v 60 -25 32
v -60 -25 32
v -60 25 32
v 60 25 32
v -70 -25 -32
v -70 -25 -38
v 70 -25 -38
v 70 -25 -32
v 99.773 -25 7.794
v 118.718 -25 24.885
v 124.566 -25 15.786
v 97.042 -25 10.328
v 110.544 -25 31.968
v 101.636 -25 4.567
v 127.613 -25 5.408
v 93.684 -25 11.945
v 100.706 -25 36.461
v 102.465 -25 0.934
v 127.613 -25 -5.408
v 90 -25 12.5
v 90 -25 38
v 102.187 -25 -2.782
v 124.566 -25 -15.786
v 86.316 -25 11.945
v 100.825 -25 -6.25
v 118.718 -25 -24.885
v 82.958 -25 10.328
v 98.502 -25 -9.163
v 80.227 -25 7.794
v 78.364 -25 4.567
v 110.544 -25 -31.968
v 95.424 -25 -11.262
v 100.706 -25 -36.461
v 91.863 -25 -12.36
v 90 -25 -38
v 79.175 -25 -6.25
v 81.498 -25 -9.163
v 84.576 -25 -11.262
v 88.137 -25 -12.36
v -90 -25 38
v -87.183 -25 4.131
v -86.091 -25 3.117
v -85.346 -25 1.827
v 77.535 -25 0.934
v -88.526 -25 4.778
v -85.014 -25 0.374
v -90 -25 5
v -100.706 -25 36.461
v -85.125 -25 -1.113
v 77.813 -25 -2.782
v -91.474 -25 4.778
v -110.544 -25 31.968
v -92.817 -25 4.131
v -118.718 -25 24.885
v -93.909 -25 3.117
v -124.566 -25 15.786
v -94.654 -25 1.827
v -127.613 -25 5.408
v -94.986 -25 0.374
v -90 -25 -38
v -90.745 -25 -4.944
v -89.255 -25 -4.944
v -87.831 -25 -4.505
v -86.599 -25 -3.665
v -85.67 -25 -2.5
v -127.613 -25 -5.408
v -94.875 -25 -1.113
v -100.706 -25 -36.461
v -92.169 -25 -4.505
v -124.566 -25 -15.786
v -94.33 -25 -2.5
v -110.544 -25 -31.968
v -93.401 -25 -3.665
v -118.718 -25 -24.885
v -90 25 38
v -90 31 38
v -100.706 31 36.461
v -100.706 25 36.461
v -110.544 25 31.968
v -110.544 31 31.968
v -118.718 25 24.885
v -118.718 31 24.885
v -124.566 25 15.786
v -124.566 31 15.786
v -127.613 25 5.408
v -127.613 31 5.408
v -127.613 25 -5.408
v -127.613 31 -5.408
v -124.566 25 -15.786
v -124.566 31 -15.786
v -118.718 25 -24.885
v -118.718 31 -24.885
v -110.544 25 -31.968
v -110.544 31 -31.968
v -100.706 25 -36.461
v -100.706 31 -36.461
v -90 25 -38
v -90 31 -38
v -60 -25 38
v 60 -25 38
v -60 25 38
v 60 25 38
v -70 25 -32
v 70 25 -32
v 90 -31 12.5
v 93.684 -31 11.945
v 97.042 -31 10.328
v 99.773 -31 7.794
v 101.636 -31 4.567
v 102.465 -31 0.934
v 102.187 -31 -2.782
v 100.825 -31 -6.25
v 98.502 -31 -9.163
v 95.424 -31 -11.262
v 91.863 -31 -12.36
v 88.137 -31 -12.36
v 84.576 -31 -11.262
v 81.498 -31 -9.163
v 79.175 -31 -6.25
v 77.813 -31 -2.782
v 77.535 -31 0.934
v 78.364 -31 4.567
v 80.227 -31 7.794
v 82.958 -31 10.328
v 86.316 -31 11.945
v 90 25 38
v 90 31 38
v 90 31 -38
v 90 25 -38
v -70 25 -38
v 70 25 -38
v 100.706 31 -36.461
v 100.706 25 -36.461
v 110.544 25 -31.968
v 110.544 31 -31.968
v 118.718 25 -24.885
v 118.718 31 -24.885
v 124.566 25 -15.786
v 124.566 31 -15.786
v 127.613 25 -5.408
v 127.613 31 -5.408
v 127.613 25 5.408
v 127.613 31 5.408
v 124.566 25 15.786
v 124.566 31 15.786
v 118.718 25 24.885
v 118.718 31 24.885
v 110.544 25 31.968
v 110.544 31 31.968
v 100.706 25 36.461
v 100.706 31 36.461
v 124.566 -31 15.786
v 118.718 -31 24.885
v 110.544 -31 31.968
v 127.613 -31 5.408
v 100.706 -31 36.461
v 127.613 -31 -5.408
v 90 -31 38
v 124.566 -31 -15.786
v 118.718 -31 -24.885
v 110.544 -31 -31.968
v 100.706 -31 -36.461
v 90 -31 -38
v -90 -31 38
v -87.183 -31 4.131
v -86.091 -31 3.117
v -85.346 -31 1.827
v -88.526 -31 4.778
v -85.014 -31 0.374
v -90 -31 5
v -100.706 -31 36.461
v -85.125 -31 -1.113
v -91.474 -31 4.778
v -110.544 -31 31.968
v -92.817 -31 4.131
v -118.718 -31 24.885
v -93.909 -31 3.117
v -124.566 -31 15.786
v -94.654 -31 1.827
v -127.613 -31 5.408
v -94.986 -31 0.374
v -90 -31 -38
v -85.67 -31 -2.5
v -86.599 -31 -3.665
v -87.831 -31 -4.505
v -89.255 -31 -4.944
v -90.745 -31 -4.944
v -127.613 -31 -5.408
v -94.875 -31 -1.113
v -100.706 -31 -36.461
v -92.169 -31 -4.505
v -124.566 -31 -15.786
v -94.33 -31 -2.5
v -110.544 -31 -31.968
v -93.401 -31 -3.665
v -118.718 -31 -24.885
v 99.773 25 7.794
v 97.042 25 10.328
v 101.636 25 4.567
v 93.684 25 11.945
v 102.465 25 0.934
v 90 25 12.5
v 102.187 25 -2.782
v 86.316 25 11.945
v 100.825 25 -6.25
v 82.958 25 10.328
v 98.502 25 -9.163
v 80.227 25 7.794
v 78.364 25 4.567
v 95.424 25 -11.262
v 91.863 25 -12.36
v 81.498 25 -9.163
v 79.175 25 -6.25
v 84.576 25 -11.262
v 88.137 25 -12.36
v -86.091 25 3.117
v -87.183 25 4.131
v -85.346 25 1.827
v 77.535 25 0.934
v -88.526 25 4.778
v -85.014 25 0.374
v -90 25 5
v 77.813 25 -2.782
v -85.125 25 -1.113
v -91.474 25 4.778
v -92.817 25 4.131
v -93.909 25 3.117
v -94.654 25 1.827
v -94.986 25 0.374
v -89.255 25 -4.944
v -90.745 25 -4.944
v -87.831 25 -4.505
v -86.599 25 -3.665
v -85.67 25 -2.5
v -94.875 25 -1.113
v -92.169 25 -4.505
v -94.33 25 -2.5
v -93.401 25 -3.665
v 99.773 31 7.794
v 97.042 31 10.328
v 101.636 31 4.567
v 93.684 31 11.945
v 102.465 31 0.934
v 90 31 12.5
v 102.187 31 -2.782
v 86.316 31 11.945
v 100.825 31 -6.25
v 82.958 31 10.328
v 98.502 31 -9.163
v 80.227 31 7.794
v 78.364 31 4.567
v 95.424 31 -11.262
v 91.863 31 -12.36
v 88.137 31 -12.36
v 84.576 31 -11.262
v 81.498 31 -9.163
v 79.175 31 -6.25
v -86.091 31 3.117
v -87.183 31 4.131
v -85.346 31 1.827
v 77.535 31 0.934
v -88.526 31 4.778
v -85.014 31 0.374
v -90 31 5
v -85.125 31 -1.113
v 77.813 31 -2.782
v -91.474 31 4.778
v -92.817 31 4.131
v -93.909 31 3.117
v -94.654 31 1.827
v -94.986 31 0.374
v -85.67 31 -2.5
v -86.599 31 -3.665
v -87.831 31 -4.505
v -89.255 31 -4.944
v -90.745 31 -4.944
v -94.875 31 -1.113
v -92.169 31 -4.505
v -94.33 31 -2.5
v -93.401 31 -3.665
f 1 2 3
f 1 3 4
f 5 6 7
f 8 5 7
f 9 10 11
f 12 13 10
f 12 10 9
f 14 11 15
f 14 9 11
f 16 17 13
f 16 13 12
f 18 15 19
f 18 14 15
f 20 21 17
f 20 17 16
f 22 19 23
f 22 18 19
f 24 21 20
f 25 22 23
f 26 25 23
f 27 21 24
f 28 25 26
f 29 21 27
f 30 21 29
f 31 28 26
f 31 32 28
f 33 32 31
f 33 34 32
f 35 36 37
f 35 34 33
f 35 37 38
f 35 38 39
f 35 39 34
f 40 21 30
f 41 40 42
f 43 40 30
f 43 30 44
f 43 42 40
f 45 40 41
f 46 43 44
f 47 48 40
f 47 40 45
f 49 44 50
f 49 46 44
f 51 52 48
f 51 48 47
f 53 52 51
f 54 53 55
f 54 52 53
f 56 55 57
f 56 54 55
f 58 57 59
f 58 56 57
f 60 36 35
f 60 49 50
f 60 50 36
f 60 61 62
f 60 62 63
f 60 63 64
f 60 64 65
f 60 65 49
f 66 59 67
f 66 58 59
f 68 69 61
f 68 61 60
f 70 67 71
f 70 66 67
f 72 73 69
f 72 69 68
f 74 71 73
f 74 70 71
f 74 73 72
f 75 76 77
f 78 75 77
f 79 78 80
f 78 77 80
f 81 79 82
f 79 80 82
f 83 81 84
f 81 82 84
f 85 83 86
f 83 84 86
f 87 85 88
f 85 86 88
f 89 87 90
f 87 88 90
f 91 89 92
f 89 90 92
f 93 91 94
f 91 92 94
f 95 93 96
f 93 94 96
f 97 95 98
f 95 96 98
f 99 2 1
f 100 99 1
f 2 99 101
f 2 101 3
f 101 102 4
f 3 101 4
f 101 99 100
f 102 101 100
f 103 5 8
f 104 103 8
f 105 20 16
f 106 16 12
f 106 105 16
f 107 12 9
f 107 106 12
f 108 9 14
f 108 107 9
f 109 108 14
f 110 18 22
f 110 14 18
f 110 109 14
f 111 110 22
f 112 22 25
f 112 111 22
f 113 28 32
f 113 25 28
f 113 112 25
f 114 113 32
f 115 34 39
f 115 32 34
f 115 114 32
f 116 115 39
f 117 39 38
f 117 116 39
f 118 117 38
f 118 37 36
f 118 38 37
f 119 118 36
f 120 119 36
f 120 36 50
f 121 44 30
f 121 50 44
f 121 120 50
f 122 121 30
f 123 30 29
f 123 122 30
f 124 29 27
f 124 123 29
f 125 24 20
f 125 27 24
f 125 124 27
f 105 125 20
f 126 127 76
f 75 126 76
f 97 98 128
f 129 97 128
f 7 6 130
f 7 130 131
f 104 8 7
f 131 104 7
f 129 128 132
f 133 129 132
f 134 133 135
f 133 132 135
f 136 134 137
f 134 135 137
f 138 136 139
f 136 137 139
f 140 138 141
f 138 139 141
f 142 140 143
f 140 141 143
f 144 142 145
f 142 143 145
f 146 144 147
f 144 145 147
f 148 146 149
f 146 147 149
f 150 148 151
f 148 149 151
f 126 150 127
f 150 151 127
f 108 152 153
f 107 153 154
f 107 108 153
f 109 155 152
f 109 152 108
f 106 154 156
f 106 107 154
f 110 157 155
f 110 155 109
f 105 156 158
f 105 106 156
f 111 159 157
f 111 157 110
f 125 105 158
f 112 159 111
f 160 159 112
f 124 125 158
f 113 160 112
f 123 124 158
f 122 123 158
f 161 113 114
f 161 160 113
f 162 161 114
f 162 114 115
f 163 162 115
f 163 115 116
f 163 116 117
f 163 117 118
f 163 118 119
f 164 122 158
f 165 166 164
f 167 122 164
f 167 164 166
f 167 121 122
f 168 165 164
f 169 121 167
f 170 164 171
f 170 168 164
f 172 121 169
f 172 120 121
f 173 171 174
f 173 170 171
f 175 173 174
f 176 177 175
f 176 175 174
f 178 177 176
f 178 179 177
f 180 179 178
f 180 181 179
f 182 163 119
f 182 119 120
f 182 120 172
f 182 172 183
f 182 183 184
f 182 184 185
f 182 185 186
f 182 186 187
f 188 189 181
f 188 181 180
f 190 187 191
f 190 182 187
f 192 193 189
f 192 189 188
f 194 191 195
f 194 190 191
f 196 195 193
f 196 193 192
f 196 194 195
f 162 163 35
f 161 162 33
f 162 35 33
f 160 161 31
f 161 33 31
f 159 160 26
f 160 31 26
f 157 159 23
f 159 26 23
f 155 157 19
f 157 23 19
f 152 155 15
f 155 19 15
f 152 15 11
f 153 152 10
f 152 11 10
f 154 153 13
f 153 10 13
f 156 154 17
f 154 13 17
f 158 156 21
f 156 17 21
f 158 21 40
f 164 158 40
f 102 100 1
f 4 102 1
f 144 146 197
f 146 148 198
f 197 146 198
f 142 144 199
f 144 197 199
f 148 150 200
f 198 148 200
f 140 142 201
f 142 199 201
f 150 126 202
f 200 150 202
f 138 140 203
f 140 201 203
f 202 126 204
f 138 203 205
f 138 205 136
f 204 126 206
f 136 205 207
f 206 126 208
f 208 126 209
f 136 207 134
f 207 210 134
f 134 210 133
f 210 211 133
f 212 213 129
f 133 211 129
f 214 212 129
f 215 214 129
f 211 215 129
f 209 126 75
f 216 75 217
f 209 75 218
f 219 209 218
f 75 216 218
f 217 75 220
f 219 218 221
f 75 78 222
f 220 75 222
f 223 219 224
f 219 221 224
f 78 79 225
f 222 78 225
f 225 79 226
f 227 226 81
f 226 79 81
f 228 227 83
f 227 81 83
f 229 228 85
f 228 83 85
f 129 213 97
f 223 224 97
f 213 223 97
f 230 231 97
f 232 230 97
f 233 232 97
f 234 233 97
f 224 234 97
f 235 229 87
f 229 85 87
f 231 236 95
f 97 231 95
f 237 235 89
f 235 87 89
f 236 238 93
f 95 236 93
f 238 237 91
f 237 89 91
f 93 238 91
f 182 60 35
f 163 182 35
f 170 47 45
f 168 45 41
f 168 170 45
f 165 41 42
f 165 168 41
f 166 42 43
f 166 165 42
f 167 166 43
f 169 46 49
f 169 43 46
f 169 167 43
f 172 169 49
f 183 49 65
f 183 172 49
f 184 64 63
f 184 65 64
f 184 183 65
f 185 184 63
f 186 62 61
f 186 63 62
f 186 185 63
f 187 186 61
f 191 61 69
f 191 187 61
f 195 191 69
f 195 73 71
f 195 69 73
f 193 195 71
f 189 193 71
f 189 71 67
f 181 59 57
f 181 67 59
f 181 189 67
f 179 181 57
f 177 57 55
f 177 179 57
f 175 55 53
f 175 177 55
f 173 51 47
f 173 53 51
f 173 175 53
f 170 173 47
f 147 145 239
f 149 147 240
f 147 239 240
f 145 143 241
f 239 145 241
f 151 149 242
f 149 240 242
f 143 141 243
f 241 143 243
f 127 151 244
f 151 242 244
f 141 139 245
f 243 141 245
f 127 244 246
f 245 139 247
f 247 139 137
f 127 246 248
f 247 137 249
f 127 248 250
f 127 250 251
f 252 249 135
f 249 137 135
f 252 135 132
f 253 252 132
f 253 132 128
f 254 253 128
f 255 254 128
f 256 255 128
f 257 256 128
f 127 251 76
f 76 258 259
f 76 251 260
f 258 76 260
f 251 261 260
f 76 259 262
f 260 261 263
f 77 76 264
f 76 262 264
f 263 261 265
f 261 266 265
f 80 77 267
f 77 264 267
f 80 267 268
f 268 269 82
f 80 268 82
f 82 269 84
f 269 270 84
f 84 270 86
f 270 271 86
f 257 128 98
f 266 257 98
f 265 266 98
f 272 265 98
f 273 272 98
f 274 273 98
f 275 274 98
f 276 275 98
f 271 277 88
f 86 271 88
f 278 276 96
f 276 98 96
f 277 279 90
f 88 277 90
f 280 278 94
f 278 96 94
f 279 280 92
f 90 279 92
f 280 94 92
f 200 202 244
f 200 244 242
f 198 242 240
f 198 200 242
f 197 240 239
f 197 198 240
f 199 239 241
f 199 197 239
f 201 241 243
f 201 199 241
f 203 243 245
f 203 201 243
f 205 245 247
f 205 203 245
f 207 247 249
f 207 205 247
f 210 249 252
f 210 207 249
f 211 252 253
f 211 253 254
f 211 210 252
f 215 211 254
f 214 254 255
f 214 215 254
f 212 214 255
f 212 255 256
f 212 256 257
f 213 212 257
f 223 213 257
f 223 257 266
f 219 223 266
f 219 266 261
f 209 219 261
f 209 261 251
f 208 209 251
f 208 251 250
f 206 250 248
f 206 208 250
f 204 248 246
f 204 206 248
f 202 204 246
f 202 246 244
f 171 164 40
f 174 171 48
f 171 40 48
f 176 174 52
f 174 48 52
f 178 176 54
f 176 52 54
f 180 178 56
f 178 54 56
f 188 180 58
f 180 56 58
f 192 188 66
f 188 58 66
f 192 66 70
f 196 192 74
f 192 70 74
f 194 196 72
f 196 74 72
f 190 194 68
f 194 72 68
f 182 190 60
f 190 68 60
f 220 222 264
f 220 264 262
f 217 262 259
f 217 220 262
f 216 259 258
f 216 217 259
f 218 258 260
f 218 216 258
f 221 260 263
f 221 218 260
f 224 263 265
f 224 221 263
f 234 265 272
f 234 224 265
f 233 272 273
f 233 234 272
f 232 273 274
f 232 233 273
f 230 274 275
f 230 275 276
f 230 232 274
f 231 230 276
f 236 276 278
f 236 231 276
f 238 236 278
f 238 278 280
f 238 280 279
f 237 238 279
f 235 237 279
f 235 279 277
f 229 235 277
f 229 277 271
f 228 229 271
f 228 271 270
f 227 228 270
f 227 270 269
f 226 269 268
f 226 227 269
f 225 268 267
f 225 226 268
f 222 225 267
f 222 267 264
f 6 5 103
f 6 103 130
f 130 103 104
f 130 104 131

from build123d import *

# Parameters (mm, degrees)
SKETCH2_R               = 12.5
SKETCH2_R_2             = 5
BOSS_EXTRUDE1_DEPTH     = 31
CUT_EXTRUDE1_DEPTH      = 138.072973266
CUT_EXTRUDE1_DEPTH_BACK = 138.072973266
SKETCH3_W               = 76
SKETCH3_H               = 50
BOSS_EXTRUDE2_REACH     = 146.79
SKETCH4_W               = 140
SKETCH4_H               = 6
SKETCH4_W_2             = 120


with BuildPart() as part:
    # Sketch2 → Boss-Extrude1 (new, symmetric)
    with BuildSketch(Plane(origin=(0, 0, 0), x_dir=(1, 0, 0), z_dir=(0, 1, 0))):
        with BuildLine():
            Line((-90, 38), (90, 38))
            ThreePointArc((90, 38), (128, 0), (90, -38))
            Line((90, -38), (-90, -38))
            ThreePointArc((-90, -38), (-128, 0), (-90, 38))
        make_face()
        with Locations(Location((90, 0, 0), (0, 0, 270))):
            Circle(SKETCH2_R, mode=Mode.SUBTRACT)
        with Locations(Location((-90, 0, 0), (0, 0, 270))):
            Circle(SKETCH2_R_2, mode=Mode.SUBTRACT)
    extrude(amount=BOSS_EXTRUDE1_DEPTH, both=True)

    # Sketch3 → Cut-Extrude1 (cut, two sides: drawn at the far end of the back side and taken through both)
    with BuildSketch(Plane(origin=(0, 0, 0), x_dir=(0, 0, -1), z_dir=(1, 0, 0)).offset(-CUT_EXTRUDE1_DEPTH_BACK)):
        Rectangle(SKETCH3_W, SKETCH3_H)
    extrude(amount=CUT_EXTRUDE1_DEPTH + CUT_EXTRUDE1_DEPTH_BACK, mode=Mode.SUBTRACT)


with BuildPart() as cut_extrude1_piece_1:
    # of the separate pieces the step leaves, piece 1, a body of its own (cut_extrude1_pieces)
    add(part.part.solids().sort_by_distance((-90, 25, -38))[0])


with BuildPart() as cut_extrude1_piece_2:
    # of the separate pieces the step leaves, piece 2, a body of its own (cut_extrude1_pieces)
    add(part.part.solids().sort_by_distance((-90, -31, -38))[0])


with BuildPart() as body_3:

    # Sketch4 → Boss-Extrude2 (new, up to next)
    with BuildSketch(Plane(origin=(0, -25, 0), x_dir=(1, 0, 0), z_dir=(0, 1, 0)), mode=Mode.PRIVATE) as boss_extrude2_sk1:
        with Locations((0, 35)):
            Rectangle(SKETCH4_W, SKETCH4_H)
    boss_extrude2_tool1 = extrude(boss_extrude2_sk1.sketch, amount=BOSS_EXTRUDE2_REACH, mode=Mode.PRIVATE) - cut_extrude1_piece_1.part
    # Sketch4 → Boss-Extrude2 (new, up to next)
    with BuildSketch(Plane(origin=(0, -25, 0), x_dir=(1, 0, 0), z_dir=(0, 1, 0)), mode=Mode.PRIVATE) as boss_extrude2_sk2:
        with Locations((0, -35)):
            Rectangle(SKETCH4_W_2, SKETCH4_H)
    boss_extrude2_tool2 = extrude(boss_extrude2_sk2.sketch, amount=BOSS_EXTRUDE2_REACH, mode=Mode.PRIVATE) - cut_extrude1_piece_1.part
    add(boss_extrude2_tool1.solids().sort_by_distance((0, -25, -35))[0])
    add(boss_extrude2_tool2.solids().sort_by_distance((0, -25, 35))[0])


solid = Compound([cut_extrude1_piece_1.part, cut_extrude1_piece_2.part, body_3.part])
